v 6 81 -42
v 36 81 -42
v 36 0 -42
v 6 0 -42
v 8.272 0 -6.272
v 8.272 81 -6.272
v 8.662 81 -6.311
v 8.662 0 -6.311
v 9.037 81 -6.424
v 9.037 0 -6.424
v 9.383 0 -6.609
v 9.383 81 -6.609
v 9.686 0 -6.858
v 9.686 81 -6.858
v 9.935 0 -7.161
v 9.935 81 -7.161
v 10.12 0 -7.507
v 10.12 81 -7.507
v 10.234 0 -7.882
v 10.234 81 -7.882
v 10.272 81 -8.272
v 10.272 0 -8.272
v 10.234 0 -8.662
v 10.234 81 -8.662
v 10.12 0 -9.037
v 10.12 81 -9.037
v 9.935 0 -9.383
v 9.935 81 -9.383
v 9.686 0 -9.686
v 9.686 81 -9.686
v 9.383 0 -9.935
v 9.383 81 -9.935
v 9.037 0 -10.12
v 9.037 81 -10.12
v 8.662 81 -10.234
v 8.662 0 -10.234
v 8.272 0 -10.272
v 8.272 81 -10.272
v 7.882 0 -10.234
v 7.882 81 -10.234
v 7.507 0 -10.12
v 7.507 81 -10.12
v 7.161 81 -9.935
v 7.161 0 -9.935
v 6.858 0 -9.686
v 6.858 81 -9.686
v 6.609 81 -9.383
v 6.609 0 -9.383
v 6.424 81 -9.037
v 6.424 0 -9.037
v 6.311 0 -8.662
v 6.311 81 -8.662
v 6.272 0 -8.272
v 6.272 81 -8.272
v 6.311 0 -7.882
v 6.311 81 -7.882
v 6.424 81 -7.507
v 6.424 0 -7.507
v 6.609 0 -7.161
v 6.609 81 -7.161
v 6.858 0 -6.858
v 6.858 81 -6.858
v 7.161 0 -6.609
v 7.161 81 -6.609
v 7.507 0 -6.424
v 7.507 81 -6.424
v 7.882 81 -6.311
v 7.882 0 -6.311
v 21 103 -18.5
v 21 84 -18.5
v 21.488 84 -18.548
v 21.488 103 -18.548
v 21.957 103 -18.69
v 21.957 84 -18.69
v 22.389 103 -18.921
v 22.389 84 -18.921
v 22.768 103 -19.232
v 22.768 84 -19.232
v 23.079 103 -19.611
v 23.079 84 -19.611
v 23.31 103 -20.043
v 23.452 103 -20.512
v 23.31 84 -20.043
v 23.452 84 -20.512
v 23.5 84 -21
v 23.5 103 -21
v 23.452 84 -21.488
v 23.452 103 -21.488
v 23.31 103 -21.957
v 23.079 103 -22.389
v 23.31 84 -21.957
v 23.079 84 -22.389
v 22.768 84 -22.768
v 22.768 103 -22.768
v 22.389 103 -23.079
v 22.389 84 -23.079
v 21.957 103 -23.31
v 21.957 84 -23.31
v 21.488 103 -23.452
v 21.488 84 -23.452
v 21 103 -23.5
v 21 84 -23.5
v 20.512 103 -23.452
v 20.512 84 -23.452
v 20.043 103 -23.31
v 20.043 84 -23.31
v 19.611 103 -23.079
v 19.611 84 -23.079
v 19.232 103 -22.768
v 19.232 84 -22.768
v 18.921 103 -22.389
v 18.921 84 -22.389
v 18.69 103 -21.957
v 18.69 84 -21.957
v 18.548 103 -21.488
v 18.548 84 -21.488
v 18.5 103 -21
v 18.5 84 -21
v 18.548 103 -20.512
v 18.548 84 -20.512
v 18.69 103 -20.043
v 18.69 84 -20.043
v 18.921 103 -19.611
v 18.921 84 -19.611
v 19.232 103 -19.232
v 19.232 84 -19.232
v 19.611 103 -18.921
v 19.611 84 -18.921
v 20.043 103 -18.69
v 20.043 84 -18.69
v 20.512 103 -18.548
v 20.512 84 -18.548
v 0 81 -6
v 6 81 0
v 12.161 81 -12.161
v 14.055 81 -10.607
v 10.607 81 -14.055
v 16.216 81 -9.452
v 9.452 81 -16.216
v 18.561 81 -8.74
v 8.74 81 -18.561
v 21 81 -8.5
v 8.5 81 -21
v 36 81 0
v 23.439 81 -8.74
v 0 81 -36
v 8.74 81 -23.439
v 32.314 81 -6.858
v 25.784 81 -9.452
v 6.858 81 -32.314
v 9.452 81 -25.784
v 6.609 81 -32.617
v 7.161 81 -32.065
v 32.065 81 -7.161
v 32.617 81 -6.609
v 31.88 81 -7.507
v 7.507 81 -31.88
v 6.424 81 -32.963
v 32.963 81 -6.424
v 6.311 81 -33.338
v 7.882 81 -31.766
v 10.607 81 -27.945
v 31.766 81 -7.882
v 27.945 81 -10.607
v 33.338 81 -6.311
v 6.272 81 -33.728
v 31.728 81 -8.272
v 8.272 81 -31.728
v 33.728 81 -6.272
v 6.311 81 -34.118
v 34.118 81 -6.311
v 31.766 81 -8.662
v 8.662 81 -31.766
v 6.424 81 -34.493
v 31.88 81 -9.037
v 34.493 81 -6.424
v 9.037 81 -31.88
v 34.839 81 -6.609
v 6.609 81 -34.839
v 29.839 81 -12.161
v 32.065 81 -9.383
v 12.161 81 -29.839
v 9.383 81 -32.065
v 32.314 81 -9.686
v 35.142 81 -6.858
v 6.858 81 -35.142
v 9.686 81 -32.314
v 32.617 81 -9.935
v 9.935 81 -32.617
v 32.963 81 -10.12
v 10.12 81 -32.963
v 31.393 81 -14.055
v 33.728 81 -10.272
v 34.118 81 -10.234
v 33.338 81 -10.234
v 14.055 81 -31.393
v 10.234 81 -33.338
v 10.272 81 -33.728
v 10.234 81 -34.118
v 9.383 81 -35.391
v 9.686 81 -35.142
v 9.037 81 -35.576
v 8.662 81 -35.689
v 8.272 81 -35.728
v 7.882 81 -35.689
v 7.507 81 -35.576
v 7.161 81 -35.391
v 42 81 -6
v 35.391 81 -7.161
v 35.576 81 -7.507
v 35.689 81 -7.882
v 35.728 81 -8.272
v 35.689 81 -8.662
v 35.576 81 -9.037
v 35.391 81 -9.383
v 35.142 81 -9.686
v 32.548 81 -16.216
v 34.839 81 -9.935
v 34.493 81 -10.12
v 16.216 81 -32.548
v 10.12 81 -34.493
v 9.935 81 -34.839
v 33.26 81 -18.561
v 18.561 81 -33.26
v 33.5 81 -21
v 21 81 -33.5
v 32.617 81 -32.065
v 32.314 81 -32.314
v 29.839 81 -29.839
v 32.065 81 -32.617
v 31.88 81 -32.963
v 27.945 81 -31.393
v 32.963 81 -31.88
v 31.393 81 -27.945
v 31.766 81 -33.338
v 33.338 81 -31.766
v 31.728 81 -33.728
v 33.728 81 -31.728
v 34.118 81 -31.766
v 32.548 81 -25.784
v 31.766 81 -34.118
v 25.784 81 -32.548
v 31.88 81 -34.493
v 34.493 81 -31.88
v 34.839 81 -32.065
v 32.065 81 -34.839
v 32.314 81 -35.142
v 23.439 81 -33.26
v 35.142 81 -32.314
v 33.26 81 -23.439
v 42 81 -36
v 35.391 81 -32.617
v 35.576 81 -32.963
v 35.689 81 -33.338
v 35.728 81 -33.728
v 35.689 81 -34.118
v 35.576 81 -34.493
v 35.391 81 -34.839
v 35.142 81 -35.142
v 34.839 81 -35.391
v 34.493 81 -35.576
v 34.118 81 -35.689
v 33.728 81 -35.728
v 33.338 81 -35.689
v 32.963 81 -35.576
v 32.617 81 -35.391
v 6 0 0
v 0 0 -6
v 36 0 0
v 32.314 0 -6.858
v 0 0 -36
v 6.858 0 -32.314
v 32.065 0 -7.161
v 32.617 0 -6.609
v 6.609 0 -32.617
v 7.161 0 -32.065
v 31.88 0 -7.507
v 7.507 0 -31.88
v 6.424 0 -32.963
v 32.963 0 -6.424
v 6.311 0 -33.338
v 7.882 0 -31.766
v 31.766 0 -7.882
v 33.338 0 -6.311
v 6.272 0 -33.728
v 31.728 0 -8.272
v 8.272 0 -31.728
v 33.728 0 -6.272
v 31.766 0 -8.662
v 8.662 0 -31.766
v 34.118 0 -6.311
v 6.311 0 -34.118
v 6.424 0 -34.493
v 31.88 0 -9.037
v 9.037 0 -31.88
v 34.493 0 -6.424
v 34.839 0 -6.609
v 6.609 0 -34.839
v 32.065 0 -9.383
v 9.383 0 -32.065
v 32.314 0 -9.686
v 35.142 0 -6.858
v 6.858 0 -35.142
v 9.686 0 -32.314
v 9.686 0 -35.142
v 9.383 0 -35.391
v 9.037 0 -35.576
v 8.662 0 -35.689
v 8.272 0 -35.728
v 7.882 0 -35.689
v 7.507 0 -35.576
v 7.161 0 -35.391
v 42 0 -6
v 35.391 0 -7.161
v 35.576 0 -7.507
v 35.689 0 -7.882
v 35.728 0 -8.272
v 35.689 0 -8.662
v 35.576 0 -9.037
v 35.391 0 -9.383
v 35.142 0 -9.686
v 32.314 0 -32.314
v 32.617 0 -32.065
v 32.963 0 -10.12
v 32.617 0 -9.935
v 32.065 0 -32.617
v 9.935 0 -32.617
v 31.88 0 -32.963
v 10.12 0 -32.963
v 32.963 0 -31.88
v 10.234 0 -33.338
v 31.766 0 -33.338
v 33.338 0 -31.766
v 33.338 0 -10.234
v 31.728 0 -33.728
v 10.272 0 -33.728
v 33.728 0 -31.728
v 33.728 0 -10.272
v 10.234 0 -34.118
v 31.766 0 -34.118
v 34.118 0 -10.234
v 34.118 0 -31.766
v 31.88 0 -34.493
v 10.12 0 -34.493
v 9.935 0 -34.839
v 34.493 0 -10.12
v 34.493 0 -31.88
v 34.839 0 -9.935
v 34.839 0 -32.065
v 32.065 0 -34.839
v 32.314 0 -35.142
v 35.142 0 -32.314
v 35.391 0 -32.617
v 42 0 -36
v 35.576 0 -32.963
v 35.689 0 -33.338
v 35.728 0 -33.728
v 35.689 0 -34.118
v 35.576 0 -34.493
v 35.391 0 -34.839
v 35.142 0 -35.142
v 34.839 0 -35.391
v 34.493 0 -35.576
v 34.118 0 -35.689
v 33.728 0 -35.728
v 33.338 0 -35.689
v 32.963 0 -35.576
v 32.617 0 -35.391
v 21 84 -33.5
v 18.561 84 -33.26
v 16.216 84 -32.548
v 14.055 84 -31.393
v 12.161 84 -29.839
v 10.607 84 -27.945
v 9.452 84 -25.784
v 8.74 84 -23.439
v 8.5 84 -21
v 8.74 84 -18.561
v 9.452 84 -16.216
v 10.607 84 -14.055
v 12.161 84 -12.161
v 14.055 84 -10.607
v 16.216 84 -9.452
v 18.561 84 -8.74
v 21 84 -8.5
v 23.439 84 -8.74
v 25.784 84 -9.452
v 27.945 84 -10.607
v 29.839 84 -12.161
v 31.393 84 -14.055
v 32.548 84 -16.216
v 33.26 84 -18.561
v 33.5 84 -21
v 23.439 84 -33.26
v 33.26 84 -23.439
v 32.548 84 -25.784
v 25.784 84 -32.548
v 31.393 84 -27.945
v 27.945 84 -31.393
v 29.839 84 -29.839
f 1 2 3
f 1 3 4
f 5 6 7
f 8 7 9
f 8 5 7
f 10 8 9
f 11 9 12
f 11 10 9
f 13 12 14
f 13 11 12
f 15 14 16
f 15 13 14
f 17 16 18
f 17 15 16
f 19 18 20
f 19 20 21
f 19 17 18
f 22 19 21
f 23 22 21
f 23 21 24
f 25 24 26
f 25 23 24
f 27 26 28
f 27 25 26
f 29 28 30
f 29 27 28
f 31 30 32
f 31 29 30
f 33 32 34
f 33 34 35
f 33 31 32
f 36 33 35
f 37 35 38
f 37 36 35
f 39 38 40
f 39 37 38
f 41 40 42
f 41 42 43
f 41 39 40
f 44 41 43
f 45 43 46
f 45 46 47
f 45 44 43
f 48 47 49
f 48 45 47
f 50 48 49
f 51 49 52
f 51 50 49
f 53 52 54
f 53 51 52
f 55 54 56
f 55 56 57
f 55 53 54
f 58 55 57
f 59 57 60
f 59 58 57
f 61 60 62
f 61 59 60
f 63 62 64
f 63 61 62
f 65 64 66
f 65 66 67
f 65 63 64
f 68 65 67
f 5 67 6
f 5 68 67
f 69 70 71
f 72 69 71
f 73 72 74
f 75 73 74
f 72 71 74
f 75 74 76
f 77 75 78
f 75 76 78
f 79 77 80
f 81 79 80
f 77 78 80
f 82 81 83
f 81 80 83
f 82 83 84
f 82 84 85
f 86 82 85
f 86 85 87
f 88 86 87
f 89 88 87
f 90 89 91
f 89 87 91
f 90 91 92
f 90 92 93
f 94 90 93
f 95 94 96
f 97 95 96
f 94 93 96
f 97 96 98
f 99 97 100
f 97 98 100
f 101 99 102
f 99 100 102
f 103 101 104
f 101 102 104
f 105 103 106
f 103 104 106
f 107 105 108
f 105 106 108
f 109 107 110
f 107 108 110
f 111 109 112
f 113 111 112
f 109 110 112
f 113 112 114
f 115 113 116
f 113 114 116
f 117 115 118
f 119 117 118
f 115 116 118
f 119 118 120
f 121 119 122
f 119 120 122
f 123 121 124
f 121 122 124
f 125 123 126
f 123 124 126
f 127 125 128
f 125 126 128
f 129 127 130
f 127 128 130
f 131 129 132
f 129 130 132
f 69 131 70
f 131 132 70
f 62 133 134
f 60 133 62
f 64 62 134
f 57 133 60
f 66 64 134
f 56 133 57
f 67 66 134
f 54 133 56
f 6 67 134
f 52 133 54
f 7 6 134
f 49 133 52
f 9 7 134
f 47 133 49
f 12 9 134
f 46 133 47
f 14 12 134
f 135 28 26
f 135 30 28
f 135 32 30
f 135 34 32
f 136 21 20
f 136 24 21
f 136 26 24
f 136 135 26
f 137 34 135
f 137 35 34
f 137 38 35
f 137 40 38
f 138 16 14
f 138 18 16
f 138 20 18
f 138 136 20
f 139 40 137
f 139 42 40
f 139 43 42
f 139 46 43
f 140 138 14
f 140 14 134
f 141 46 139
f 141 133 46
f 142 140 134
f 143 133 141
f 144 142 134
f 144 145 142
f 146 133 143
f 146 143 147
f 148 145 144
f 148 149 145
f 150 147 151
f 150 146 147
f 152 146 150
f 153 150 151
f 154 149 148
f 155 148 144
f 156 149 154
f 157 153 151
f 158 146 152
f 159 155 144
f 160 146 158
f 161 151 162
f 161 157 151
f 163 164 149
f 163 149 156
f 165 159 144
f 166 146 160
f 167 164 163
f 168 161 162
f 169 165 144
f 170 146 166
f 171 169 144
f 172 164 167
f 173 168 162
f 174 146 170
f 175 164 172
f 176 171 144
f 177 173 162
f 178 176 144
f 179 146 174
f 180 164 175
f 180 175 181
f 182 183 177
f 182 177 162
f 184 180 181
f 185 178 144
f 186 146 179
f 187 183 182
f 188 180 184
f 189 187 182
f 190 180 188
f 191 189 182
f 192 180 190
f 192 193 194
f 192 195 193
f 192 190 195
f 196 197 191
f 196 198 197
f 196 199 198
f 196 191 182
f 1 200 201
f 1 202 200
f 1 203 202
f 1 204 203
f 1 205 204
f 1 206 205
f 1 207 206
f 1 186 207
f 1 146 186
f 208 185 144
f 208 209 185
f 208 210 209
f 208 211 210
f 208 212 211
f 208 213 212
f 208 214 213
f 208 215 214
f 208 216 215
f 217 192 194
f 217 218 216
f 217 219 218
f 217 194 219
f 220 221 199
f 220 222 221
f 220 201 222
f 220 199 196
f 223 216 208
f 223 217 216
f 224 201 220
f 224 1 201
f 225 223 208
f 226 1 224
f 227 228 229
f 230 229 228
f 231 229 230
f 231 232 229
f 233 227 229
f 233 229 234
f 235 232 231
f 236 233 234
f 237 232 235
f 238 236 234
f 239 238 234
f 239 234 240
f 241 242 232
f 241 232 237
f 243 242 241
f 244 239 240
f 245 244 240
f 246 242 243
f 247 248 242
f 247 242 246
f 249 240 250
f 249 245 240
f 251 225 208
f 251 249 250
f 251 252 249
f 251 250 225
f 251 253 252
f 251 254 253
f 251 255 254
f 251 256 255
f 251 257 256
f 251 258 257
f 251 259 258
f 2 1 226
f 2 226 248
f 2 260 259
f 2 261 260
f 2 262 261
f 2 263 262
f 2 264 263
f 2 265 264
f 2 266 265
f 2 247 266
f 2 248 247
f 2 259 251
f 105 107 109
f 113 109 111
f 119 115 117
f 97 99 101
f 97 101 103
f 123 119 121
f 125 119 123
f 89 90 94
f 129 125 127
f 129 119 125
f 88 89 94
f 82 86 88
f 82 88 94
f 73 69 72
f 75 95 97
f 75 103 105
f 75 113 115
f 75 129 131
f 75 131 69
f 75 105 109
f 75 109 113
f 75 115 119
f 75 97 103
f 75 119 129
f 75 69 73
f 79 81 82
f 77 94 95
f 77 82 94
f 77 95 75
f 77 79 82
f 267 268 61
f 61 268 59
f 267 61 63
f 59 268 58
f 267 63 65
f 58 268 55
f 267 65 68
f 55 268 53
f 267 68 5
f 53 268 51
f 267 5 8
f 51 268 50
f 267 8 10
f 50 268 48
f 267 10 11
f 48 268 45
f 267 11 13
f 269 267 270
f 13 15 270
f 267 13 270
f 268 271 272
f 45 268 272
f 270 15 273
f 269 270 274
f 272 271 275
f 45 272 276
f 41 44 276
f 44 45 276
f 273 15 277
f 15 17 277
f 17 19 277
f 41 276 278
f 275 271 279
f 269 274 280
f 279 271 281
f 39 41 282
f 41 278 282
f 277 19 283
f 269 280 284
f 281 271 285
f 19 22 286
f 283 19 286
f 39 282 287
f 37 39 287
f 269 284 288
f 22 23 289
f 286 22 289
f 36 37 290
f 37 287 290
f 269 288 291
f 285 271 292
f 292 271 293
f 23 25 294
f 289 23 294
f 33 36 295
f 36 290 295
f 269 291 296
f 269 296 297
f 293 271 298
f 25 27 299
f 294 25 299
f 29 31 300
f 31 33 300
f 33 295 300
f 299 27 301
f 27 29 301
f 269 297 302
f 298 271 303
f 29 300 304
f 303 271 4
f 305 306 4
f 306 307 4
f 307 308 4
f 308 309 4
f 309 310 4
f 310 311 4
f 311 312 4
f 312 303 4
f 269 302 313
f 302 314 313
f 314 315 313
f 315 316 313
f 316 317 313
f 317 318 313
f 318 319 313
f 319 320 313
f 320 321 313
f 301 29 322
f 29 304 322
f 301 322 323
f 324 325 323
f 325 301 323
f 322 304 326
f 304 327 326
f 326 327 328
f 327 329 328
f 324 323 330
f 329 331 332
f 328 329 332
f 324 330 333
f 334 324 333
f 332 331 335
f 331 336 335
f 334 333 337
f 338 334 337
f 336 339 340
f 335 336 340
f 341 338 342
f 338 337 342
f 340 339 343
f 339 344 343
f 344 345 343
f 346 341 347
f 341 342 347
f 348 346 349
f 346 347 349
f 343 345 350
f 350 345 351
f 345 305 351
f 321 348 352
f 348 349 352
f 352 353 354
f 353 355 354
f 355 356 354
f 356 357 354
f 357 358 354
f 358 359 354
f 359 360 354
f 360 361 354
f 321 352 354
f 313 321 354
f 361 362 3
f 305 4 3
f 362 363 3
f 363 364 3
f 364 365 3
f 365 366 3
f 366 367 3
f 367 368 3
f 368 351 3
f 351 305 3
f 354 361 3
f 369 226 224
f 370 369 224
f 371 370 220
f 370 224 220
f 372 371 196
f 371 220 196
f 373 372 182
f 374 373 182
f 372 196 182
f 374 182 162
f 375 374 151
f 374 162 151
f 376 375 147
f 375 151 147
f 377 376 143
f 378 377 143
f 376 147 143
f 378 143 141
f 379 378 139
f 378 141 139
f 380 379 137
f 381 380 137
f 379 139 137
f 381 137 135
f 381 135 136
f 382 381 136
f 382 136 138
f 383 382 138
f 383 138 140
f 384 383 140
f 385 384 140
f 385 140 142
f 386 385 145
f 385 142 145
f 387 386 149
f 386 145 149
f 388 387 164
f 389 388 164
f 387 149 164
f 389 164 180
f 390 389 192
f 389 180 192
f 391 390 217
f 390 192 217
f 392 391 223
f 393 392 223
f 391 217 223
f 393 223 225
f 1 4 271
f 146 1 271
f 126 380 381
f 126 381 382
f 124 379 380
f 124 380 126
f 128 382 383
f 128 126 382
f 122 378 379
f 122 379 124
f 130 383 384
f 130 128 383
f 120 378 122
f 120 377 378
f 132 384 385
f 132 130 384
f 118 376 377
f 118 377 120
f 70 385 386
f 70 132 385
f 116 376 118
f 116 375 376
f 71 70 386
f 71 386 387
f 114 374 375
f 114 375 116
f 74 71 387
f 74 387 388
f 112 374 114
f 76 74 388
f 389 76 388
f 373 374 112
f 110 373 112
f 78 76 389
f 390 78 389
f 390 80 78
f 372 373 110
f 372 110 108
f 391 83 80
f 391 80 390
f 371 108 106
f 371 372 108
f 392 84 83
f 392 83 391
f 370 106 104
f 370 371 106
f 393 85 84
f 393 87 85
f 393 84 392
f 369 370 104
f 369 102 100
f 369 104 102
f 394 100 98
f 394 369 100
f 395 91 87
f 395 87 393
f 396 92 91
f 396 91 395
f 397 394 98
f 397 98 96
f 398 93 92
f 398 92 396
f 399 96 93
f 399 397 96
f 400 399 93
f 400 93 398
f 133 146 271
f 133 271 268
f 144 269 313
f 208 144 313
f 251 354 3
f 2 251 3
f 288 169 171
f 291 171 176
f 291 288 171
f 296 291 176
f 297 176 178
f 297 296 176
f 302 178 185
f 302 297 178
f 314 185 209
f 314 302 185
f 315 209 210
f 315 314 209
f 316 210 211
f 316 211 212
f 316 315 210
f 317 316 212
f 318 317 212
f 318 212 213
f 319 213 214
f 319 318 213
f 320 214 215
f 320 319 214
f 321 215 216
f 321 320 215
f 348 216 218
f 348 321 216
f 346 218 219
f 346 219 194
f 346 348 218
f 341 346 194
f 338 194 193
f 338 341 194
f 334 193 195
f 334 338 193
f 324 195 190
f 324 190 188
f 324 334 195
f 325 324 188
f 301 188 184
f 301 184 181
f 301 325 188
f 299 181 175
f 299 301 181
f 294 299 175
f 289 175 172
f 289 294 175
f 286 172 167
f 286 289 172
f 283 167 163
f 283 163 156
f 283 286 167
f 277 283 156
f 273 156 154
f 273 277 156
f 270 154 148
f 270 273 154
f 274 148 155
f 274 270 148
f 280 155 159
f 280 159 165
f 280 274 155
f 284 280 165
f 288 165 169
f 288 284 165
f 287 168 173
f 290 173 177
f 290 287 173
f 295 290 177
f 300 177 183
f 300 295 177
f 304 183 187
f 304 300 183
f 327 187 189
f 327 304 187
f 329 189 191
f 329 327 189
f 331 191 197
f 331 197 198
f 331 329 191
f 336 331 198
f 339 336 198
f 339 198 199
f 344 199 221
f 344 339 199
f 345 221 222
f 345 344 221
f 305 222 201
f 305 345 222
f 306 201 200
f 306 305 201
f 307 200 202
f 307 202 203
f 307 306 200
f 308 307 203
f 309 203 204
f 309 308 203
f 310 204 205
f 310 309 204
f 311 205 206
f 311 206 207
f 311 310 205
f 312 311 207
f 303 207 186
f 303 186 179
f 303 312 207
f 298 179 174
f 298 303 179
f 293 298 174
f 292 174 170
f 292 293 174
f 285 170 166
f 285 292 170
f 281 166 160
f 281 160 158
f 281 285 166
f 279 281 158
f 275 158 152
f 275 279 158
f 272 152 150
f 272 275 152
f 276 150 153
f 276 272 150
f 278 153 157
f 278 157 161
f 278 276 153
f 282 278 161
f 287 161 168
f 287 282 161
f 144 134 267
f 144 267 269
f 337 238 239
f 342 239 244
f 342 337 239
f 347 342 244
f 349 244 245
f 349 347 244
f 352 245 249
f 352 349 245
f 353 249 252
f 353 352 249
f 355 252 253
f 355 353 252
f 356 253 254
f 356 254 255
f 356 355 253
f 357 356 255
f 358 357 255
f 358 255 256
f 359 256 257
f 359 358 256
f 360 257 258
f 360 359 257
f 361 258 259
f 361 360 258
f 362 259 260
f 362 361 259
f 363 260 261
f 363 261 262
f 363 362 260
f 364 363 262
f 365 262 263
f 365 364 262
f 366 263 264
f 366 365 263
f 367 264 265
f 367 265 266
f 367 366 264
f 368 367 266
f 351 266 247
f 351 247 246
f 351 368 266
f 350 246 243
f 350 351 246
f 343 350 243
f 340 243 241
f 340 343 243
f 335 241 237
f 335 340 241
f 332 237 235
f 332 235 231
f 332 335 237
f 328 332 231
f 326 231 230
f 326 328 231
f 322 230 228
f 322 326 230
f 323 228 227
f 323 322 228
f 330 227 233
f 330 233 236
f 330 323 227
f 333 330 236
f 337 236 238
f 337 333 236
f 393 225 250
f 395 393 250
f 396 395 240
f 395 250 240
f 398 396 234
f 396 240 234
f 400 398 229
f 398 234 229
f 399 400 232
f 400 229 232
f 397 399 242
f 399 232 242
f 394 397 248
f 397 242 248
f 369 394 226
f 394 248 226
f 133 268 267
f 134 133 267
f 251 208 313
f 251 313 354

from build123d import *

# Parameters (mm, degrees)
SZKIC1_R                    = 2
DODANIE_WYCI_GNI_CIE1_DEPTH = 81
DODANIE_WYCI_GNI_CIE2_DEPTH = 3
SZKIC3_R                    = 2.5
DODANIE_WYCI_GNI_CIE3_DEPTH = 19


with BuildPart() as part:
    # Szkic1 → Dodanie-wyciągnięcie1 (new body)
    with BuildSketch(Plane(origin=(0, 0, 0), x_dir=(1, 0, 0), z_dir=(0, 1, 0))):
        Polygon((6, 0), (36, 0), (42, 6), (42, 36), (36, 42), (6, 42), (0, 36), (0, 6), align=None)
        with Locations(Location((33.727922061, 33.727922061, 0), (0, 0, 270))):
            Circle(SZKIC1_R, mode=Mode.SUBTRACT)
        with Locations(Location((33.727922061, 8.272077939, 0), (0, 0, 270))):
            Circle(SZKIC1_R, mode=Mode.SUBTRACT)
        with Locations(Location((8.272077939, 8.272077939, 0), (0, 0, 270))):
            Circle(SZKIC1_R, mode=Mode.SUBTRACT)
        with Locations(Location((8.272077939, 33.727922061, 0), (0, 0, 270))):
            Circle(SZKIC1_R, mode=Mode.SUBTRACT)
    extrude(amount=DODANIE_WYCI_GNI_CIE1_DEPTH)

    # Szkic2 → Dodanie-wyciągnięcie2 (add)
    with BuildSketch(Plane(origin=(0, 81, 0), x_dir=(1, 0, 0), z_dir=(0, 1, 0))):
        with BuildLine():
            ThreePointArc((33.5, 21), (29.838834765, 29.838834765), (21, 33.5))
            Line((21, 33.5), (21, 21))
            Line((21, 21), (33.5, 21))
        make_face()
        with BuildLine():
            Line((21, 21), (21, 33.5))
            ThreePointArc((21, 33.5), (12.161165235, 12.161165235), (33.5, 21))
            Line((33.5, 21), (21, 21))
        make_face()
    extrude(amount=DODANIE_WYCI_GNI_CIE2_DEPTH)

    # Szkic3 → Dodanie-wyciągnięcie3 (add)
    with BuildSketch(Plane(origin=(0, 84, 0), x_dir=(1, 0, 0), z_dir=(0, 1, 0))):
        with Locations(Location((21, 21, 0), (0, 0, 270))):
            Circle(SZKIC3_R)
    extrude(amount=DODANIE_WYCI_GNI_CIE3_DEPTH)


solid = part.part
